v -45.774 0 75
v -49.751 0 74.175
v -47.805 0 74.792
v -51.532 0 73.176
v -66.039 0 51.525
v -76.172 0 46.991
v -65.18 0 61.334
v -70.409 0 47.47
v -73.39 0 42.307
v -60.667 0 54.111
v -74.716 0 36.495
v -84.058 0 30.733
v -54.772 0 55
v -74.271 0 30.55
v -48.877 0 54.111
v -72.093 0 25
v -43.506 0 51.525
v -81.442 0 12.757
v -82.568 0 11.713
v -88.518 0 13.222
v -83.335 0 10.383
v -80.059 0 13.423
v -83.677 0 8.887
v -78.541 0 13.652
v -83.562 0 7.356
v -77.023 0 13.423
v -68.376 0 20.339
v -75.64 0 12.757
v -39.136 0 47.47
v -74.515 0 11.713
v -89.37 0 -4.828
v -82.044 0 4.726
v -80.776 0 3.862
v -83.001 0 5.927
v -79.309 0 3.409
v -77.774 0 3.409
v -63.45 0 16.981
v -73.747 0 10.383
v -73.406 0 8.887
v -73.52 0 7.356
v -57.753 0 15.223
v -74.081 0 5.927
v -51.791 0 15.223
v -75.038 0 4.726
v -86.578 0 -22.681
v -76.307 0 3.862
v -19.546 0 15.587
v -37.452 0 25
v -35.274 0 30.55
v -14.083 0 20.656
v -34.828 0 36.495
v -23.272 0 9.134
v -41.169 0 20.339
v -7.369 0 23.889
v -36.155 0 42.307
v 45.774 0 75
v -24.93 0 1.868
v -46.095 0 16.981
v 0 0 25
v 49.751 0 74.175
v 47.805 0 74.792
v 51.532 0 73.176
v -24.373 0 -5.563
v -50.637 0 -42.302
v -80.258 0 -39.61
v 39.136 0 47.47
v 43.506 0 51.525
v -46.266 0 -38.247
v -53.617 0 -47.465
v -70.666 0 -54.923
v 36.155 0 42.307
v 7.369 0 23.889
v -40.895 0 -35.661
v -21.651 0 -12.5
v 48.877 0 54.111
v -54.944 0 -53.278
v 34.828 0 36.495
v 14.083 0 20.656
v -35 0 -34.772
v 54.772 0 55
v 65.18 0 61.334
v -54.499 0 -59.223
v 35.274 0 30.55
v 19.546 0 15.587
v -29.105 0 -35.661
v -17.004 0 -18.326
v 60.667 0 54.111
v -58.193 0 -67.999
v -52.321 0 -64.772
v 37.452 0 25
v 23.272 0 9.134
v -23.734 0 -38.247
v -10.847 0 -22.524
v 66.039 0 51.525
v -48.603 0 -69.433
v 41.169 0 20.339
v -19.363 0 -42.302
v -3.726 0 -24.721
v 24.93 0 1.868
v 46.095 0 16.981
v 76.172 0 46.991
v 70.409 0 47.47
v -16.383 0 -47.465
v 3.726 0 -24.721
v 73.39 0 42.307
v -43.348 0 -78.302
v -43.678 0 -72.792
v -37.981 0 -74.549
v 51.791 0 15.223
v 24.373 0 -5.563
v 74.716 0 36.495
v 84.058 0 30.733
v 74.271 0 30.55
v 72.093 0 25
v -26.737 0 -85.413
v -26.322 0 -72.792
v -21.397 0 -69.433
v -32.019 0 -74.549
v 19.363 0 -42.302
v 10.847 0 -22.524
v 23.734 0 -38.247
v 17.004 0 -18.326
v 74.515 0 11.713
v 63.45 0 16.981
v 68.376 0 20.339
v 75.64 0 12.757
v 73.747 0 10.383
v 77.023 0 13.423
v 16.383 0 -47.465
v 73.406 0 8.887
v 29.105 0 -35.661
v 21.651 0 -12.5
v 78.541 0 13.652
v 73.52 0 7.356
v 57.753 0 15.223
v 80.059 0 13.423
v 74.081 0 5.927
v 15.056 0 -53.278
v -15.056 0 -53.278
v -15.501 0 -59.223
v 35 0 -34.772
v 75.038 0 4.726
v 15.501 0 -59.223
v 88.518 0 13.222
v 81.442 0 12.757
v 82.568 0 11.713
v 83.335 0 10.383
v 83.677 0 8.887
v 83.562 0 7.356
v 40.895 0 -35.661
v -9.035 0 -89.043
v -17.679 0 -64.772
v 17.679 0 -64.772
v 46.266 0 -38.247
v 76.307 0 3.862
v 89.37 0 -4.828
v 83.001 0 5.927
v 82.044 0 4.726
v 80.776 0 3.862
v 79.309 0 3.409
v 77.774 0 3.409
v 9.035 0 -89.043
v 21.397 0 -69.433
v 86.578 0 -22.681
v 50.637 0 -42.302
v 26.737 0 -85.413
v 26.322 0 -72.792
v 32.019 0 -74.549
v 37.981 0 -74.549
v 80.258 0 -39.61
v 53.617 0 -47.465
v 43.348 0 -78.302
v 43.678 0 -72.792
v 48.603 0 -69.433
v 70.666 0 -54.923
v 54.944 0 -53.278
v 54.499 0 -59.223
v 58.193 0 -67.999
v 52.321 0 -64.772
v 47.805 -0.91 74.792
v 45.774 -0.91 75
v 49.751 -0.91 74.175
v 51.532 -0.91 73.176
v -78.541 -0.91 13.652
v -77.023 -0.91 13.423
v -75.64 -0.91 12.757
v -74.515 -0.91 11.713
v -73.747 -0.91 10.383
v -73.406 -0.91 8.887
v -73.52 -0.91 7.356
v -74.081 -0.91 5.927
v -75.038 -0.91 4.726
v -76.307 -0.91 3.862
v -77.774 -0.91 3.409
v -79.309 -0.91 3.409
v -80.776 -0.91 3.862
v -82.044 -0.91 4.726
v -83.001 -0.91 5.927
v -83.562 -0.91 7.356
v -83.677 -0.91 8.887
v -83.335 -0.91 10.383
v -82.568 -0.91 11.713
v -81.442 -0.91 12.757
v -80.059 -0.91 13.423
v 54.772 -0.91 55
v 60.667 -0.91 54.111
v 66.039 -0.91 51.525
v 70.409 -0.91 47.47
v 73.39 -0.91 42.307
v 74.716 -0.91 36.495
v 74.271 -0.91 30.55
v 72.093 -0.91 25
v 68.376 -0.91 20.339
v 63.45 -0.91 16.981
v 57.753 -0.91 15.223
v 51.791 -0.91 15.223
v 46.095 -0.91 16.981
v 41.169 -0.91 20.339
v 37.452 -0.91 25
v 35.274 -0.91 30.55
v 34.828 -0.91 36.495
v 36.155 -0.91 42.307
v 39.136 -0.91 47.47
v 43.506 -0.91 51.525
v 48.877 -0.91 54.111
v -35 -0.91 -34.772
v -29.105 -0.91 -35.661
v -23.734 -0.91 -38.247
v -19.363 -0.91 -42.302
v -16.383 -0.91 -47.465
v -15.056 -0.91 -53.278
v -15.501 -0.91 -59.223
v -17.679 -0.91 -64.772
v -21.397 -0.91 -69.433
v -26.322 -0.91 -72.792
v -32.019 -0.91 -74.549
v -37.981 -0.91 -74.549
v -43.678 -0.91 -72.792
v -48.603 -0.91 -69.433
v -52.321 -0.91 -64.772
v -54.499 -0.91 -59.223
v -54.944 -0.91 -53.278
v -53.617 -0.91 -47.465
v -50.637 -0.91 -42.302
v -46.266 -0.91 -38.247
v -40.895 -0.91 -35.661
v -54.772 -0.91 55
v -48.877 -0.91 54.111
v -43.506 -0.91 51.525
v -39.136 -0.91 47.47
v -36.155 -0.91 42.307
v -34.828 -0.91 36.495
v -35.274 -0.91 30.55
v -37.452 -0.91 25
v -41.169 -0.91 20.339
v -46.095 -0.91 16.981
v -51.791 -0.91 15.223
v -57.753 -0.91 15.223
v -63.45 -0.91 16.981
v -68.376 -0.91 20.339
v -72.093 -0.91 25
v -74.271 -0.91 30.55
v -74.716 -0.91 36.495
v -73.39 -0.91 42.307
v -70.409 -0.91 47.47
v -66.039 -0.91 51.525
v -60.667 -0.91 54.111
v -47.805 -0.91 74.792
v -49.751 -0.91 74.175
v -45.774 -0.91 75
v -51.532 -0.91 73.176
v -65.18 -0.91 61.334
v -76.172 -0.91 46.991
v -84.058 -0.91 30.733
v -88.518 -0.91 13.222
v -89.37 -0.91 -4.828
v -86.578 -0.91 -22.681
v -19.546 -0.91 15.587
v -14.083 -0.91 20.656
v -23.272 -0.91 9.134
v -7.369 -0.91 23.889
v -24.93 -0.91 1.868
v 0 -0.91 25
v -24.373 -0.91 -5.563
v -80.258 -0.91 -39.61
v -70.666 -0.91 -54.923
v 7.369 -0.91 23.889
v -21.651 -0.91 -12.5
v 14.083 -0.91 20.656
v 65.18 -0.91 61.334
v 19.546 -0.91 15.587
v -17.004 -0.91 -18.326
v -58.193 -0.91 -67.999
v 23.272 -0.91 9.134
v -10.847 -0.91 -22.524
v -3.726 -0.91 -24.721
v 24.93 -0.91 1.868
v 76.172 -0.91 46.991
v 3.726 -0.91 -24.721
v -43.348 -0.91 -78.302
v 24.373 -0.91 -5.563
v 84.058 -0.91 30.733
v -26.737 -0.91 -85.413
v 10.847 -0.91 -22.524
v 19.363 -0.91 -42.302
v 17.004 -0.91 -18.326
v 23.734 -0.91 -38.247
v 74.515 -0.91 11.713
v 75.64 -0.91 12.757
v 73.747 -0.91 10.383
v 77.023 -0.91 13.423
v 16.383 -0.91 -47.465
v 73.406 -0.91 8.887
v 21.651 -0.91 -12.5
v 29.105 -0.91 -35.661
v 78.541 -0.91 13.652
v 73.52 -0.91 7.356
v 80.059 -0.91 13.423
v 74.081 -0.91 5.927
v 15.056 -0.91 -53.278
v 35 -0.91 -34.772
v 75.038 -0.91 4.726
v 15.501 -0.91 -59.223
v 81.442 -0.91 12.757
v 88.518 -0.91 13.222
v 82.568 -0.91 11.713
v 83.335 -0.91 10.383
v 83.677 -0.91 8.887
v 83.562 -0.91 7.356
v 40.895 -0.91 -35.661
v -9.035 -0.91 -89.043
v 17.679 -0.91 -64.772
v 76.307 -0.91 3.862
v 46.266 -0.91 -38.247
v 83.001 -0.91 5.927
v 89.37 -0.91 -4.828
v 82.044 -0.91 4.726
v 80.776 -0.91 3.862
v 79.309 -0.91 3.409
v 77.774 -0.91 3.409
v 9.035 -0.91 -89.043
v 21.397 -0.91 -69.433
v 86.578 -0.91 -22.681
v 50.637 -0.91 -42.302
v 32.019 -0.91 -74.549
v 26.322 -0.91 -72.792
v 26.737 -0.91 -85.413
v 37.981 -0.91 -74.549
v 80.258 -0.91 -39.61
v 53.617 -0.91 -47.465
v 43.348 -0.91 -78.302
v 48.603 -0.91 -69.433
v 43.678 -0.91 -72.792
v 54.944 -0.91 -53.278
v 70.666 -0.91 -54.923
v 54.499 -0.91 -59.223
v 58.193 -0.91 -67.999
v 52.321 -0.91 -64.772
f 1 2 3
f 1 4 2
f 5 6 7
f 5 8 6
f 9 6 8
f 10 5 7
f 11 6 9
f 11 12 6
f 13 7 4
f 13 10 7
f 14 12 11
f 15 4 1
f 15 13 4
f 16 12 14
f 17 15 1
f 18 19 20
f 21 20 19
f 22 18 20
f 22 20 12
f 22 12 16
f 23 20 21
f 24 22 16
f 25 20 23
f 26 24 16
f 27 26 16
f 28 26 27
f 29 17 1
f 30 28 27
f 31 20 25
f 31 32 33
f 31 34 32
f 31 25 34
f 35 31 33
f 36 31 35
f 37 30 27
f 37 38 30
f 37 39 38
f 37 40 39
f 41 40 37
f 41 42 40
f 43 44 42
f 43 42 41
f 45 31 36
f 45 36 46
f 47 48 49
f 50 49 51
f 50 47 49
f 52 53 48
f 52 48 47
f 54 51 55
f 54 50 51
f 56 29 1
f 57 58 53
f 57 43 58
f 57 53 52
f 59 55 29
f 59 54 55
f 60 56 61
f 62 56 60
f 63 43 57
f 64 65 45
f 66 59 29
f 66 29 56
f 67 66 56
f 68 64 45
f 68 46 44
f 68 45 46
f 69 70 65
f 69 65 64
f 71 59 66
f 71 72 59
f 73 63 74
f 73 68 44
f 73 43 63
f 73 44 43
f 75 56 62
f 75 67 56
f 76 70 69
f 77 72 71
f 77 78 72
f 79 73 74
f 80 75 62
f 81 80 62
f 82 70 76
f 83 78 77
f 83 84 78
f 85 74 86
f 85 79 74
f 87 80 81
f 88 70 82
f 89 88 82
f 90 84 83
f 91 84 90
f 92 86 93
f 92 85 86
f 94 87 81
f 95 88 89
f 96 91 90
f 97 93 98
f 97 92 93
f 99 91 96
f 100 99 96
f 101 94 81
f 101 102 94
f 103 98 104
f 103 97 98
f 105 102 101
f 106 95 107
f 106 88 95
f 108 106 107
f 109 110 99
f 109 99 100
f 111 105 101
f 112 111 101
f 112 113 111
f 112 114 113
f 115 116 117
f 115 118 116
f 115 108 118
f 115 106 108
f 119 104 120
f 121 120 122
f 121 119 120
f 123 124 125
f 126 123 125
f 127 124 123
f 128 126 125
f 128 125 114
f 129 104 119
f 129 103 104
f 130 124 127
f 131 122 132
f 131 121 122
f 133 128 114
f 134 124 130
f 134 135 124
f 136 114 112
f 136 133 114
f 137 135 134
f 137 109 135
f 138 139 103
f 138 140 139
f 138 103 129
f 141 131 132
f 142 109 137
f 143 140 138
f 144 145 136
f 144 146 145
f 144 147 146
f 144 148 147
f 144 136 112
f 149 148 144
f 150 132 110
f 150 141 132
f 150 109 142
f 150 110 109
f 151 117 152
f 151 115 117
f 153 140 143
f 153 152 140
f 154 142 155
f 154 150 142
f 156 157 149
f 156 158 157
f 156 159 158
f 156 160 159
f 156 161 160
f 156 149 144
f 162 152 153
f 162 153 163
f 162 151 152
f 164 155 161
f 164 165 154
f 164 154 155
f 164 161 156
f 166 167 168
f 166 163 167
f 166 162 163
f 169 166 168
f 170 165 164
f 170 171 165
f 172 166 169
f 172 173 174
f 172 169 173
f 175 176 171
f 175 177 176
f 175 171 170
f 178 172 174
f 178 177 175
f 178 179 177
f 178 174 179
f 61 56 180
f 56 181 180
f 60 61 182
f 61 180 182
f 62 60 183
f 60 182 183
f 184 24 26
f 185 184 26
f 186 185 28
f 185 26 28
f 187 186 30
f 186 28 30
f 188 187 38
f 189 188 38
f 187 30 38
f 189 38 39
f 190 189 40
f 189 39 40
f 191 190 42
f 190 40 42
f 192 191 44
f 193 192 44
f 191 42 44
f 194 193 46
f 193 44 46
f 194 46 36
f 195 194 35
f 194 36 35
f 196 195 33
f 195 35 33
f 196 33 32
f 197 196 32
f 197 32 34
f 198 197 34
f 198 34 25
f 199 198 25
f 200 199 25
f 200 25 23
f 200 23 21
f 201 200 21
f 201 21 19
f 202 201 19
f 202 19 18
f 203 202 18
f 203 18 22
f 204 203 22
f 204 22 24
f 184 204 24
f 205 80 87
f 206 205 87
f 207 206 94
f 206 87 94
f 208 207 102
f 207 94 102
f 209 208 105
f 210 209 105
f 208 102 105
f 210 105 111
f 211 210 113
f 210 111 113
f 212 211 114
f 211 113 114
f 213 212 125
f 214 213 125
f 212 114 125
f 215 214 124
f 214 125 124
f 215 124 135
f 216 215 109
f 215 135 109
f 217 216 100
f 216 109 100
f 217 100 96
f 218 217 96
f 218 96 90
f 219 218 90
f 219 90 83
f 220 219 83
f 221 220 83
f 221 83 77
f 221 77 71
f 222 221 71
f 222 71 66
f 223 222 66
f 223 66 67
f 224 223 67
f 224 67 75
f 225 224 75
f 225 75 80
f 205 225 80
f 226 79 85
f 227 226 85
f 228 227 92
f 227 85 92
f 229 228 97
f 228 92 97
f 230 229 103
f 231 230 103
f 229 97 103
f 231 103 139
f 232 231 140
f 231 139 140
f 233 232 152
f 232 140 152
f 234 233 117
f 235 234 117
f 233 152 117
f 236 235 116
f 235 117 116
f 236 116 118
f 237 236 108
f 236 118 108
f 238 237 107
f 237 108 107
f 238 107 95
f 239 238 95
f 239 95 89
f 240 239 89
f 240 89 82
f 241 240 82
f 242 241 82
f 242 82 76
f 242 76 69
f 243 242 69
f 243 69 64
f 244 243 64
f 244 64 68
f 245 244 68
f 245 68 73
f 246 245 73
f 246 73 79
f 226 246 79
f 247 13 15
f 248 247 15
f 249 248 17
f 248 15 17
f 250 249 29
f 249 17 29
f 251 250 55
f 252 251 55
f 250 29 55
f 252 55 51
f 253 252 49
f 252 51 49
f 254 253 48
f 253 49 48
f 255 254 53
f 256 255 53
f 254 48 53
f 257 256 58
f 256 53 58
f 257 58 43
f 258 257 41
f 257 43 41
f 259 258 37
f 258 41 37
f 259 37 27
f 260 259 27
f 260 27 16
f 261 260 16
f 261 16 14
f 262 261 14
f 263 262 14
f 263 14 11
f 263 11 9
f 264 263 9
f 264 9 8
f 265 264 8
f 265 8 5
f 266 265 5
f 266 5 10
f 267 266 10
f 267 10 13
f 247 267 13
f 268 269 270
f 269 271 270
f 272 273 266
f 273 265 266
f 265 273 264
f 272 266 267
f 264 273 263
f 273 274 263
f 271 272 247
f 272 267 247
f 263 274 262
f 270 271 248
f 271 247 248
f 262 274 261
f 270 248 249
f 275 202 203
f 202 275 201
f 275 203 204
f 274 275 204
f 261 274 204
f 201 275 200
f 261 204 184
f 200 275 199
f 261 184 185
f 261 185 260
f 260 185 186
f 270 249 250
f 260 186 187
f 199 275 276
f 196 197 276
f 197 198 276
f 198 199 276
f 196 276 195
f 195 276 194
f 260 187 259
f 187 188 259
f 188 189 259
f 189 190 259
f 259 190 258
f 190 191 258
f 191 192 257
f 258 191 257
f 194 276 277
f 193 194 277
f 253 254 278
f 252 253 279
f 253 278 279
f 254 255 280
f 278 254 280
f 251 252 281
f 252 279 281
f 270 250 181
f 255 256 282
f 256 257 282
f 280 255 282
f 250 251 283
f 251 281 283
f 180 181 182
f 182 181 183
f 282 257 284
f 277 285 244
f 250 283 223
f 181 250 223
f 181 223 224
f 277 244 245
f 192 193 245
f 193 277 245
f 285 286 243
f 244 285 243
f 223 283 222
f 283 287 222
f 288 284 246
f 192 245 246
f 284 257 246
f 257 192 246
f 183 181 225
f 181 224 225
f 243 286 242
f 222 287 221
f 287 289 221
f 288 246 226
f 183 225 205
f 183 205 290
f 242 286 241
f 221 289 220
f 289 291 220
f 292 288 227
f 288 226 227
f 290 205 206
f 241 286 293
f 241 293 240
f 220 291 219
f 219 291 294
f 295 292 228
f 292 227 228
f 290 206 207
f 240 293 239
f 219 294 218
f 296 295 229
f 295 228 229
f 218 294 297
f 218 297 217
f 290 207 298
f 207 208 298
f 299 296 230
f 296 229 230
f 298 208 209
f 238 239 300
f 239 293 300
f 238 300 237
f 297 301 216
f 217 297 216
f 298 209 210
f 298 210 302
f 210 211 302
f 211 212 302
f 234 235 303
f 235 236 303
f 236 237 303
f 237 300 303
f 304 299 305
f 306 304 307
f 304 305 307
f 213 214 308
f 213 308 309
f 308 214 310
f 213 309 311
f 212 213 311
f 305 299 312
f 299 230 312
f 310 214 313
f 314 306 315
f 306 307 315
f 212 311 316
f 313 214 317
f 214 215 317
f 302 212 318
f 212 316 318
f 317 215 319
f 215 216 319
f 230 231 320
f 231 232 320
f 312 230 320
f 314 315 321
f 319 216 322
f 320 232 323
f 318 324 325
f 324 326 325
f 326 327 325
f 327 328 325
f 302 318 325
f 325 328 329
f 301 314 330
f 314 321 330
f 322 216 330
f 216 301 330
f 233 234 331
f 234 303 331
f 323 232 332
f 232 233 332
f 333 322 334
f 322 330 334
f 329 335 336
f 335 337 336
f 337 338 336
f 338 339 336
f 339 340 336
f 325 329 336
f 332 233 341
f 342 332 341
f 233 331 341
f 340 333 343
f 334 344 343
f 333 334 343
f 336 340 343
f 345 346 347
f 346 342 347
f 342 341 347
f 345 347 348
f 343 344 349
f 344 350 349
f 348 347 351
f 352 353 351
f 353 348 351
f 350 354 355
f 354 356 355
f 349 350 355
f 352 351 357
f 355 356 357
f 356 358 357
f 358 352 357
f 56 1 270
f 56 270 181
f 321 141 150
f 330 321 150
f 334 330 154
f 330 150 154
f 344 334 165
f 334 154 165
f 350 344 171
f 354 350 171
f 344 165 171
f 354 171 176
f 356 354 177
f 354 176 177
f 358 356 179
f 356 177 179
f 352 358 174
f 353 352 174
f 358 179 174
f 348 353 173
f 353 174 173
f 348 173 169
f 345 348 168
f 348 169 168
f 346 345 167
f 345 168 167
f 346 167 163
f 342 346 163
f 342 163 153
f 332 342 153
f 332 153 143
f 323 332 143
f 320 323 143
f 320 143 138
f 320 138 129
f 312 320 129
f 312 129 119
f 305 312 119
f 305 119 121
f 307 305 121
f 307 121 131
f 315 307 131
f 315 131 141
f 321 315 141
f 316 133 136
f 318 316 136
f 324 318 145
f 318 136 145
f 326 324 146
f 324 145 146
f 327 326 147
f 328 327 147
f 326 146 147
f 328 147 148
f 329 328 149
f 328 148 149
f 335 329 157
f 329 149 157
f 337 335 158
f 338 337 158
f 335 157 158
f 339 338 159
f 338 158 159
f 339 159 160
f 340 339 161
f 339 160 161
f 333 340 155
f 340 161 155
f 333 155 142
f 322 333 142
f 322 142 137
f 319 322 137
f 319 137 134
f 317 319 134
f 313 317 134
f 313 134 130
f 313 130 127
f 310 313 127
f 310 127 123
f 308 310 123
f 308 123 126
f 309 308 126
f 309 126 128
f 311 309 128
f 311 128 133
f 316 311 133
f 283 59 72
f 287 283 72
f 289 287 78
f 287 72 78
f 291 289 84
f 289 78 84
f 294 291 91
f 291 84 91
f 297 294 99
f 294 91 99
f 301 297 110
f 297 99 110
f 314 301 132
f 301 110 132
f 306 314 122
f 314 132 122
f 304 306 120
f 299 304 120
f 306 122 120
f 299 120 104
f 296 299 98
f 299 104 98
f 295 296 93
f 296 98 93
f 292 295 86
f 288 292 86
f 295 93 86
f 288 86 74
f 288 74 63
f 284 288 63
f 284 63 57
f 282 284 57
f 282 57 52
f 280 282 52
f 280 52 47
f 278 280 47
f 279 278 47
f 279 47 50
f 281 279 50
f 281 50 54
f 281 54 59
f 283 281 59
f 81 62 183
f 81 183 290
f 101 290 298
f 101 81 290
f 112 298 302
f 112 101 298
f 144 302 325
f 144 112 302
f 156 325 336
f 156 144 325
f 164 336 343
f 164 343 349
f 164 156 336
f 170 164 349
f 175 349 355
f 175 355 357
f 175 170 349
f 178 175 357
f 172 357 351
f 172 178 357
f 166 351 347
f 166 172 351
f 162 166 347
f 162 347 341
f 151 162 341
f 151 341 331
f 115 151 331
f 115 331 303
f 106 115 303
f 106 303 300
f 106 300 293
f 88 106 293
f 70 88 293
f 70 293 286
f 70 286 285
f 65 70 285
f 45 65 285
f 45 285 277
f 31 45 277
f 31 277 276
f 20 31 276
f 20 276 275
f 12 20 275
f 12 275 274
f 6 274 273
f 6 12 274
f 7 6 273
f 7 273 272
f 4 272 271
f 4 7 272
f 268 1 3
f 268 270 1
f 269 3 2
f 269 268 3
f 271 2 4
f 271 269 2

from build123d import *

# Parameters (mm, degrees)
BOSS_EXTRUDE1_DEPTH = 0.91
SKETCH9_R           = 5.15
CUT_EXTRUDE3_DEPTH  = 127.575385048
VISION_PATTERN_R    = 25
VISION_PATTERN_R_2  = 20
CUT_EXTRUDE4_DEPTH  = 127.575385048
FILLET1_R           = 10


with BuildPart() as part:
    # Sketch1 → Boss-Extrude1 (new body)
    with BuildSketch(Plane(origin=(0, 0, 0), x_dir=(1, 0, 0), z_dir=(0, 1, 0))):
        with BuildLine():
            Line((-48.839021284, -75), (48.839021284, -75))
            ThreePointArc((48.839021284, -75), (0, 89.5), (-48.839021284, -75))
        make_face()
    extrude(amount=-BOSS_EXTRUDE1_DEPTH)

    # Sketch9 → Cut-Extrude3 (cut, through all)
    with BuildSketch(Plane(origin=(0, 0, 0), x_dir=(1, 0, 0), z_dir=(0, 1, 0))):
        with Locations(Location((78.541209232, -8.501673503, 0), (0, 0, 270))):
            Circle(SKETCH9_R)
        with Locations(Location((-78.541209232, -8.501673503, 0), (0, 0, 270))):
            Circle(SKETCH9_R)
    extrude(amount=-CUT_EXTRUDE3_DEPTH, mode=Mode.SUBTRACT)

    # Vision Pattern → Cut-Extrude4 (cut, through all)
    with BuildSketch(Plane(origin=(0, 0, 0), x_dir=(1, 0, 0), z_dir=(0, 1, 0))):
        with Locations(Location((0, 0, 0), (0, 0, 270))):
            Circle(VISION_PATTERN_R)
        with Locations(Location((54.772255751, -35, 0), (0, 0, 270))):
            Circle(VISION_PATTERN_R_2)
        with Locations(Location((-54.772255751, -35, 0), (0, 0, 270))):
            Circle(VISION_PATTERN_R_2)
        with Locations(Location((35, 54.772255751, 0), (0, 0, 270))):
            Circle(VISION_PATTERN_R_2)
        with Locations(Location((-35, 54.772255751, 0), (0, 0, 270))):
            Circle(VISION_PATTERN_R_2)
    extrude(amount=-CUT_EXTRUDE4_DEPTH, mode=Mode.SUBTRACT)

    # Fillet1
    fillet1_edges = [part.edges().sort_by_distance(p)[0] for p in [
        (48.839021284, -0.455, 75),
        (-48.839021284, -0.455, 75),
    ]]
    fillet(fillet1_edges, radius=FILLET1_R)


solid = part.part
